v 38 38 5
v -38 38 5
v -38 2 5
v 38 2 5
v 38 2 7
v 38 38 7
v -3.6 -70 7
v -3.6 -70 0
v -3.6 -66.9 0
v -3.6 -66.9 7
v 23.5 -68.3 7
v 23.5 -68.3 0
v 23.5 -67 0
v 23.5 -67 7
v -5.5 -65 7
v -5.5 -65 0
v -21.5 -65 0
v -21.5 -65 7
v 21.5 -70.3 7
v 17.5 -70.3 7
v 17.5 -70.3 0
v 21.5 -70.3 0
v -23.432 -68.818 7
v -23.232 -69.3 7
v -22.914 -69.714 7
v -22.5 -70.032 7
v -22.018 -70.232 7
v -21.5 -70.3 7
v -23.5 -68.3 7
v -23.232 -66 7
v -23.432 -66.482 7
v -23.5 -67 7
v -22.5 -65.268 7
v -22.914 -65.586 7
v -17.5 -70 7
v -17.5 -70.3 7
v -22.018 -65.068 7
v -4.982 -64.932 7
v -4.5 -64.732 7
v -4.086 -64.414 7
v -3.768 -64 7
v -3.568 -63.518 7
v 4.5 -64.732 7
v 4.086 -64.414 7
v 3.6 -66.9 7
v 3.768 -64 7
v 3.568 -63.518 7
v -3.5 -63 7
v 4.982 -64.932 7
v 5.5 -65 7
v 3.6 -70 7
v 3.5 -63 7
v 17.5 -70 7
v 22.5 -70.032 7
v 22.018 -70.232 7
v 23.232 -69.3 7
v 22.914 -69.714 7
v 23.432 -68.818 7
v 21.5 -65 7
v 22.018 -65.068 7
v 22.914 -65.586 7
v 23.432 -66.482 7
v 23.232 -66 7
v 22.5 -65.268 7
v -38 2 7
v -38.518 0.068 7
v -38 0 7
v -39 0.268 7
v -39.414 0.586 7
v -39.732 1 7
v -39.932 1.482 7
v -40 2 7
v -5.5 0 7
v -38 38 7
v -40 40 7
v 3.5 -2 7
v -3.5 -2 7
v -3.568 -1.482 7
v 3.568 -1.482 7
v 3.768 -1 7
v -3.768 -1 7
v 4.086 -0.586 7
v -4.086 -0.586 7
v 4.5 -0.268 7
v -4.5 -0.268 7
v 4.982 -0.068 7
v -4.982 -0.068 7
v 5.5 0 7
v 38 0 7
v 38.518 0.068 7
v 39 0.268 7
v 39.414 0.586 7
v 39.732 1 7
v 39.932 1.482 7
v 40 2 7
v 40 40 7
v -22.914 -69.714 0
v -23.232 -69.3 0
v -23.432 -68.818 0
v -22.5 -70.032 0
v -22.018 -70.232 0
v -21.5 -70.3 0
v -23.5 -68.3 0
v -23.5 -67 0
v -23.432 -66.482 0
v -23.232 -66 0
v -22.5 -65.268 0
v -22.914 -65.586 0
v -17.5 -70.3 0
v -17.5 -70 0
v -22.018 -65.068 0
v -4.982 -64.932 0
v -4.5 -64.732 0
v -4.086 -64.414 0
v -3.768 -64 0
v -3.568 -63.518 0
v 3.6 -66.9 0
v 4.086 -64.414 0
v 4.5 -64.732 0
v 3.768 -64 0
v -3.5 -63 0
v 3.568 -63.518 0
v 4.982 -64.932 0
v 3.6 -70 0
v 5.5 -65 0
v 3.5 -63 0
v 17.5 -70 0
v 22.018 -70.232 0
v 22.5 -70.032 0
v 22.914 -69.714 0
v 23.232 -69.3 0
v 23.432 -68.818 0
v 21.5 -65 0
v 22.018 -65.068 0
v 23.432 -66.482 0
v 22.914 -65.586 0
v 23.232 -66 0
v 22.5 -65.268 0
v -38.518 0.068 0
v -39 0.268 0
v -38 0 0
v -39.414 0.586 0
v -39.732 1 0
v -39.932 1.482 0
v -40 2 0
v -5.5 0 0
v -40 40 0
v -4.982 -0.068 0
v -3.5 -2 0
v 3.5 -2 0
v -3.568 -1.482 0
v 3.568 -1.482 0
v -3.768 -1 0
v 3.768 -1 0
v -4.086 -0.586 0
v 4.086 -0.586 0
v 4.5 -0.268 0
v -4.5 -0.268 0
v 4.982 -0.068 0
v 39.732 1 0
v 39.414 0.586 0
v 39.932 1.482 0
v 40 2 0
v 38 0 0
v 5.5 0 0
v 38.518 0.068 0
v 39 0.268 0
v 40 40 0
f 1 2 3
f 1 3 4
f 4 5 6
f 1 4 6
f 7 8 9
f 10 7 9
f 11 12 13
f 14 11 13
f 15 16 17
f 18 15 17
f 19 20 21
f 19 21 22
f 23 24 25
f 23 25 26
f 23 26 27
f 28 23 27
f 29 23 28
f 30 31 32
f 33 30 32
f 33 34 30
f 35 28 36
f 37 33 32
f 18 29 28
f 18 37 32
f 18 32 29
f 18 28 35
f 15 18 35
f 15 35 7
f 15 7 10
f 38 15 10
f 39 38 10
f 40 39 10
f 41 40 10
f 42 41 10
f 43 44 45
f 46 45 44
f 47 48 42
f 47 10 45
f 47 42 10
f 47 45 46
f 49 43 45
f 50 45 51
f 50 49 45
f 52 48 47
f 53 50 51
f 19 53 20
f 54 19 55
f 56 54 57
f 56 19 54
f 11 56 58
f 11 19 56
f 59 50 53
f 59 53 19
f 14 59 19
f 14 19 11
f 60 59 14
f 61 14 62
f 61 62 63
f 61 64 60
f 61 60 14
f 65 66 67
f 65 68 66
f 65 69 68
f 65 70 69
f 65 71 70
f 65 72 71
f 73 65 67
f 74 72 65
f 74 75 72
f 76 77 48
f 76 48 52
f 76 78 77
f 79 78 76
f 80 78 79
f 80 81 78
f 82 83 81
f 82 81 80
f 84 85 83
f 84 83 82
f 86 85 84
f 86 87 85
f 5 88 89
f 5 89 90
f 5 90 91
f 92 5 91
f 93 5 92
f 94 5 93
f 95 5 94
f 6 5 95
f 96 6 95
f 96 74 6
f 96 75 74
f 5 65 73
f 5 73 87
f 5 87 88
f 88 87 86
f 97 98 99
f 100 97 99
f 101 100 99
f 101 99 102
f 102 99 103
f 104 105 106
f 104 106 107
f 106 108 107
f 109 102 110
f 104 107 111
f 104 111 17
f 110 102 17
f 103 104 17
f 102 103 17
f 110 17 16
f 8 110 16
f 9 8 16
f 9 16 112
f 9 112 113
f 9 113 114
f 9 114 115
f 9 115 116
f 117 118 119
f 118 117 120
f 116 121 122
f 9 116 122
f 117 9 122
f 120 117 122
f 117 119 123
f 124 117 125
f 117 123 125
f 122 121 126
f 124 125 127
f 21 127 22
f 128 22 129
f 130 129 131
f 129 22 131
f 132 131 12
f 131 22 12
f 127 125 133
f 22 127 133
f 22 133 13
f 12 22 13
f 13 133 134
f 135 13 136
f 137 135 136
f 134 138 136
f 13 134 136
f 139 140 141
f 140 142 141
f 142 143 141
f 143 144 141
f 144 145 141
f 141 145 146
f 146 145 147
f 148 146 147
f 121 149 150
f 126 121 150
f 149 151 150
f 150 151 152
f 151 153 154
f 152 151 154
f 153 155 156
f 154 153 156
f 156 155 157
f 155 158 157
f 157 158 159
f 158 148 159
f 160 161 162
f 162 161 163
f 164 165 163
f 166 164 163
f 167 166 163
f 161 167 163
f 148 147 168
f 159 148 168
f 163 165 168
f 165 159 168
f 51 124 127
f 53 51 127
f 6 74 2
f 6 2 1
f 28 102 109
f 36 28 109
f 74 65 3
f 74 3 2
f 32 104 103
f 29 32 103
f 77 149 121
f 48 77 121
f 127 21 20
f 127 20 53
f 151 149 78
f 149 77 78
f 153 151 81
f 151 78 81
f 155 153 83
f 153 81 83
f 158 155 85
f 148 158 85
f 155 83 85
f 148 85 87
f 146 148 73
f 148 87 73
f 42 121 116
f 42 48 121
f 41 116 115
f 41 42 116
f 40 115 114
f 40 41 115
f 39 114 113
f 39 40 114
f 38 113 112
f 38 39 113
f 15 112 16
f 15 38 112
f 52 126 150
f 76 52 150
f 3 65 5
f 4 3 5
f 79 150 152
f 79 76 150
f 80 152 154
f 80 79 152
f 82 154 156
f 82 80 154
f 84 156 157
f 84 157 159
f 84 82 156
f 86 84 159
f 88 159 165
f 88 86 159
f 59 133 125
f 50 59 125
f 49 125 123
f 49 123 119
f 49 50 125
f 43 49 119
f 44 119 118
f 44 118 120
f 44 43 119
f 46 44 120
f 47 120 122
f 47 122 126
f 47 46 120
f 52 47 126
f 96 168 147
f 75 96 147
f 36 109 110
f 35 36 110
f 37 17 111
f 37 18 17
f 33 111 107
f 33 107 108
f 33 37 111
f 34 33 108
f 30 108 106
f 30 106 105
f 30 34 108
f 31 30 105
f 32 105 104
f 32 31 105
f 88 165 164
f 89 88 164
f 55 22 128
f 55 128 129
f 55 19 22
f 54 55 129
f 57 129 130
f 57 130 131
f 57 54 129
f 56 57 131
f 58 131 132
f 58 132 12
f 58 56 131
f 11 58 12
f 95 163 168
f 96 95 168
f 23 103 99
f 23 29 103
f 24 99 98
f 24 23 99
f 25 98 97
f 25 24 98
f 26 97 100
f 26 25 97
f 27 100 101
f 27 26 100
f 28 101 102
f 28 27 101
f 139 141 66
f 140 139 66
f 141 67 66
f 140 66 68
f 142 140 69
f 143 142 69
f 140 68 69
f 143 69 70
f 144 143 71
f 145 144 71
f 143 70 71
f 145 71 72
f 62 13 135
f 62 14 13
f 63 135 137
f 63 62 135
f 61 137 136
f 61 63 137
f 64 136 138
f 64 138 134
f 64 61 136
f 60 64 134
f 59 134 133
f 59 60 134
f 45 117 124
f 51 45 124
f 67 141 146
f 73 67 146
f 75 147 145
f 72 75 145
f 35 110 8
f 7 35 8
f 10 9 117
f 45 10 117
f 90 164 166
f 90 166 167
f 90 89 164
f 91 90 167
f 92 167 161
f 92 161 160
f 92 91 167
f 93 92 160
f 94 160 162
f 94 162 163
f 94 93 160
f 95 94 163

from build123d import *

# Parameters (mm, degrees)
F0_W     = 6
F0_H     = 0.3
F1_DEPTH = 7
F2_W     = 76
F2_H     = 36
F3_DEPTH = 2
F4_R     = 2


# Not quite as in the source:
# - a feature names something its author has since deleted; it is built from what else it names


with BuildPart() as f1:
    # F0 (on Top) → F1 (new body)
    with BuildSketch(Plane.XY):
        Polygon((3.5, 0), (-3.5, 0), (-3.5, -65), (-23.5, -65), (-23.5, -70), (-17.5, -70), (-3.6, -70), (-3.6, -66.9), (3.6, -66.9), (3.6, -70), (17.5, -70), (23.5, -70), (23.5, -65), (3.5, -65), align=None)
        with Locations((-20.5, -70.15)):
            Rectangle(F0_W, F0_H)
        with Locations((20.5, -70.15)):
            Rectangle(F0_W, F0_H)
        Polygon((-40, 40), (-40, 0), (-3.5, 0), (3.5, 0), (40, 0), (40, 40), align=None)
    extrude(amount=F1_DEPTH)

    # F2 (on face) → F3 (cut)
    with BuildSketch(Plane.XY.offset(7)):
        with Locations((0, 20)):
            Rectangle(F2_W, F2_H)
    extrude(amount=-F3_DEPTH, mode=Mode.SUBTRACT)

    # F4
    f4_edges = [f1.edges().sort_by_distance(p)[0] for p in [
        (-3.5, 0, 3.5),
        (3.5, 0, 3.5),
        (3.5, -65, 3.5),
        (-3.5, -65, 3.5),
        (-23.5, -65, 3.5),
        (23.5, -65, 3.5),
        (-23.5, -70.3, 3.5),
        (23.5, -70.3, 3.5),
        (40, 0, 3.5),
        (-40, 0, 3.5),
    ]]
    fillet(f4_edges, radius=F4_R)


solid = f1.part
